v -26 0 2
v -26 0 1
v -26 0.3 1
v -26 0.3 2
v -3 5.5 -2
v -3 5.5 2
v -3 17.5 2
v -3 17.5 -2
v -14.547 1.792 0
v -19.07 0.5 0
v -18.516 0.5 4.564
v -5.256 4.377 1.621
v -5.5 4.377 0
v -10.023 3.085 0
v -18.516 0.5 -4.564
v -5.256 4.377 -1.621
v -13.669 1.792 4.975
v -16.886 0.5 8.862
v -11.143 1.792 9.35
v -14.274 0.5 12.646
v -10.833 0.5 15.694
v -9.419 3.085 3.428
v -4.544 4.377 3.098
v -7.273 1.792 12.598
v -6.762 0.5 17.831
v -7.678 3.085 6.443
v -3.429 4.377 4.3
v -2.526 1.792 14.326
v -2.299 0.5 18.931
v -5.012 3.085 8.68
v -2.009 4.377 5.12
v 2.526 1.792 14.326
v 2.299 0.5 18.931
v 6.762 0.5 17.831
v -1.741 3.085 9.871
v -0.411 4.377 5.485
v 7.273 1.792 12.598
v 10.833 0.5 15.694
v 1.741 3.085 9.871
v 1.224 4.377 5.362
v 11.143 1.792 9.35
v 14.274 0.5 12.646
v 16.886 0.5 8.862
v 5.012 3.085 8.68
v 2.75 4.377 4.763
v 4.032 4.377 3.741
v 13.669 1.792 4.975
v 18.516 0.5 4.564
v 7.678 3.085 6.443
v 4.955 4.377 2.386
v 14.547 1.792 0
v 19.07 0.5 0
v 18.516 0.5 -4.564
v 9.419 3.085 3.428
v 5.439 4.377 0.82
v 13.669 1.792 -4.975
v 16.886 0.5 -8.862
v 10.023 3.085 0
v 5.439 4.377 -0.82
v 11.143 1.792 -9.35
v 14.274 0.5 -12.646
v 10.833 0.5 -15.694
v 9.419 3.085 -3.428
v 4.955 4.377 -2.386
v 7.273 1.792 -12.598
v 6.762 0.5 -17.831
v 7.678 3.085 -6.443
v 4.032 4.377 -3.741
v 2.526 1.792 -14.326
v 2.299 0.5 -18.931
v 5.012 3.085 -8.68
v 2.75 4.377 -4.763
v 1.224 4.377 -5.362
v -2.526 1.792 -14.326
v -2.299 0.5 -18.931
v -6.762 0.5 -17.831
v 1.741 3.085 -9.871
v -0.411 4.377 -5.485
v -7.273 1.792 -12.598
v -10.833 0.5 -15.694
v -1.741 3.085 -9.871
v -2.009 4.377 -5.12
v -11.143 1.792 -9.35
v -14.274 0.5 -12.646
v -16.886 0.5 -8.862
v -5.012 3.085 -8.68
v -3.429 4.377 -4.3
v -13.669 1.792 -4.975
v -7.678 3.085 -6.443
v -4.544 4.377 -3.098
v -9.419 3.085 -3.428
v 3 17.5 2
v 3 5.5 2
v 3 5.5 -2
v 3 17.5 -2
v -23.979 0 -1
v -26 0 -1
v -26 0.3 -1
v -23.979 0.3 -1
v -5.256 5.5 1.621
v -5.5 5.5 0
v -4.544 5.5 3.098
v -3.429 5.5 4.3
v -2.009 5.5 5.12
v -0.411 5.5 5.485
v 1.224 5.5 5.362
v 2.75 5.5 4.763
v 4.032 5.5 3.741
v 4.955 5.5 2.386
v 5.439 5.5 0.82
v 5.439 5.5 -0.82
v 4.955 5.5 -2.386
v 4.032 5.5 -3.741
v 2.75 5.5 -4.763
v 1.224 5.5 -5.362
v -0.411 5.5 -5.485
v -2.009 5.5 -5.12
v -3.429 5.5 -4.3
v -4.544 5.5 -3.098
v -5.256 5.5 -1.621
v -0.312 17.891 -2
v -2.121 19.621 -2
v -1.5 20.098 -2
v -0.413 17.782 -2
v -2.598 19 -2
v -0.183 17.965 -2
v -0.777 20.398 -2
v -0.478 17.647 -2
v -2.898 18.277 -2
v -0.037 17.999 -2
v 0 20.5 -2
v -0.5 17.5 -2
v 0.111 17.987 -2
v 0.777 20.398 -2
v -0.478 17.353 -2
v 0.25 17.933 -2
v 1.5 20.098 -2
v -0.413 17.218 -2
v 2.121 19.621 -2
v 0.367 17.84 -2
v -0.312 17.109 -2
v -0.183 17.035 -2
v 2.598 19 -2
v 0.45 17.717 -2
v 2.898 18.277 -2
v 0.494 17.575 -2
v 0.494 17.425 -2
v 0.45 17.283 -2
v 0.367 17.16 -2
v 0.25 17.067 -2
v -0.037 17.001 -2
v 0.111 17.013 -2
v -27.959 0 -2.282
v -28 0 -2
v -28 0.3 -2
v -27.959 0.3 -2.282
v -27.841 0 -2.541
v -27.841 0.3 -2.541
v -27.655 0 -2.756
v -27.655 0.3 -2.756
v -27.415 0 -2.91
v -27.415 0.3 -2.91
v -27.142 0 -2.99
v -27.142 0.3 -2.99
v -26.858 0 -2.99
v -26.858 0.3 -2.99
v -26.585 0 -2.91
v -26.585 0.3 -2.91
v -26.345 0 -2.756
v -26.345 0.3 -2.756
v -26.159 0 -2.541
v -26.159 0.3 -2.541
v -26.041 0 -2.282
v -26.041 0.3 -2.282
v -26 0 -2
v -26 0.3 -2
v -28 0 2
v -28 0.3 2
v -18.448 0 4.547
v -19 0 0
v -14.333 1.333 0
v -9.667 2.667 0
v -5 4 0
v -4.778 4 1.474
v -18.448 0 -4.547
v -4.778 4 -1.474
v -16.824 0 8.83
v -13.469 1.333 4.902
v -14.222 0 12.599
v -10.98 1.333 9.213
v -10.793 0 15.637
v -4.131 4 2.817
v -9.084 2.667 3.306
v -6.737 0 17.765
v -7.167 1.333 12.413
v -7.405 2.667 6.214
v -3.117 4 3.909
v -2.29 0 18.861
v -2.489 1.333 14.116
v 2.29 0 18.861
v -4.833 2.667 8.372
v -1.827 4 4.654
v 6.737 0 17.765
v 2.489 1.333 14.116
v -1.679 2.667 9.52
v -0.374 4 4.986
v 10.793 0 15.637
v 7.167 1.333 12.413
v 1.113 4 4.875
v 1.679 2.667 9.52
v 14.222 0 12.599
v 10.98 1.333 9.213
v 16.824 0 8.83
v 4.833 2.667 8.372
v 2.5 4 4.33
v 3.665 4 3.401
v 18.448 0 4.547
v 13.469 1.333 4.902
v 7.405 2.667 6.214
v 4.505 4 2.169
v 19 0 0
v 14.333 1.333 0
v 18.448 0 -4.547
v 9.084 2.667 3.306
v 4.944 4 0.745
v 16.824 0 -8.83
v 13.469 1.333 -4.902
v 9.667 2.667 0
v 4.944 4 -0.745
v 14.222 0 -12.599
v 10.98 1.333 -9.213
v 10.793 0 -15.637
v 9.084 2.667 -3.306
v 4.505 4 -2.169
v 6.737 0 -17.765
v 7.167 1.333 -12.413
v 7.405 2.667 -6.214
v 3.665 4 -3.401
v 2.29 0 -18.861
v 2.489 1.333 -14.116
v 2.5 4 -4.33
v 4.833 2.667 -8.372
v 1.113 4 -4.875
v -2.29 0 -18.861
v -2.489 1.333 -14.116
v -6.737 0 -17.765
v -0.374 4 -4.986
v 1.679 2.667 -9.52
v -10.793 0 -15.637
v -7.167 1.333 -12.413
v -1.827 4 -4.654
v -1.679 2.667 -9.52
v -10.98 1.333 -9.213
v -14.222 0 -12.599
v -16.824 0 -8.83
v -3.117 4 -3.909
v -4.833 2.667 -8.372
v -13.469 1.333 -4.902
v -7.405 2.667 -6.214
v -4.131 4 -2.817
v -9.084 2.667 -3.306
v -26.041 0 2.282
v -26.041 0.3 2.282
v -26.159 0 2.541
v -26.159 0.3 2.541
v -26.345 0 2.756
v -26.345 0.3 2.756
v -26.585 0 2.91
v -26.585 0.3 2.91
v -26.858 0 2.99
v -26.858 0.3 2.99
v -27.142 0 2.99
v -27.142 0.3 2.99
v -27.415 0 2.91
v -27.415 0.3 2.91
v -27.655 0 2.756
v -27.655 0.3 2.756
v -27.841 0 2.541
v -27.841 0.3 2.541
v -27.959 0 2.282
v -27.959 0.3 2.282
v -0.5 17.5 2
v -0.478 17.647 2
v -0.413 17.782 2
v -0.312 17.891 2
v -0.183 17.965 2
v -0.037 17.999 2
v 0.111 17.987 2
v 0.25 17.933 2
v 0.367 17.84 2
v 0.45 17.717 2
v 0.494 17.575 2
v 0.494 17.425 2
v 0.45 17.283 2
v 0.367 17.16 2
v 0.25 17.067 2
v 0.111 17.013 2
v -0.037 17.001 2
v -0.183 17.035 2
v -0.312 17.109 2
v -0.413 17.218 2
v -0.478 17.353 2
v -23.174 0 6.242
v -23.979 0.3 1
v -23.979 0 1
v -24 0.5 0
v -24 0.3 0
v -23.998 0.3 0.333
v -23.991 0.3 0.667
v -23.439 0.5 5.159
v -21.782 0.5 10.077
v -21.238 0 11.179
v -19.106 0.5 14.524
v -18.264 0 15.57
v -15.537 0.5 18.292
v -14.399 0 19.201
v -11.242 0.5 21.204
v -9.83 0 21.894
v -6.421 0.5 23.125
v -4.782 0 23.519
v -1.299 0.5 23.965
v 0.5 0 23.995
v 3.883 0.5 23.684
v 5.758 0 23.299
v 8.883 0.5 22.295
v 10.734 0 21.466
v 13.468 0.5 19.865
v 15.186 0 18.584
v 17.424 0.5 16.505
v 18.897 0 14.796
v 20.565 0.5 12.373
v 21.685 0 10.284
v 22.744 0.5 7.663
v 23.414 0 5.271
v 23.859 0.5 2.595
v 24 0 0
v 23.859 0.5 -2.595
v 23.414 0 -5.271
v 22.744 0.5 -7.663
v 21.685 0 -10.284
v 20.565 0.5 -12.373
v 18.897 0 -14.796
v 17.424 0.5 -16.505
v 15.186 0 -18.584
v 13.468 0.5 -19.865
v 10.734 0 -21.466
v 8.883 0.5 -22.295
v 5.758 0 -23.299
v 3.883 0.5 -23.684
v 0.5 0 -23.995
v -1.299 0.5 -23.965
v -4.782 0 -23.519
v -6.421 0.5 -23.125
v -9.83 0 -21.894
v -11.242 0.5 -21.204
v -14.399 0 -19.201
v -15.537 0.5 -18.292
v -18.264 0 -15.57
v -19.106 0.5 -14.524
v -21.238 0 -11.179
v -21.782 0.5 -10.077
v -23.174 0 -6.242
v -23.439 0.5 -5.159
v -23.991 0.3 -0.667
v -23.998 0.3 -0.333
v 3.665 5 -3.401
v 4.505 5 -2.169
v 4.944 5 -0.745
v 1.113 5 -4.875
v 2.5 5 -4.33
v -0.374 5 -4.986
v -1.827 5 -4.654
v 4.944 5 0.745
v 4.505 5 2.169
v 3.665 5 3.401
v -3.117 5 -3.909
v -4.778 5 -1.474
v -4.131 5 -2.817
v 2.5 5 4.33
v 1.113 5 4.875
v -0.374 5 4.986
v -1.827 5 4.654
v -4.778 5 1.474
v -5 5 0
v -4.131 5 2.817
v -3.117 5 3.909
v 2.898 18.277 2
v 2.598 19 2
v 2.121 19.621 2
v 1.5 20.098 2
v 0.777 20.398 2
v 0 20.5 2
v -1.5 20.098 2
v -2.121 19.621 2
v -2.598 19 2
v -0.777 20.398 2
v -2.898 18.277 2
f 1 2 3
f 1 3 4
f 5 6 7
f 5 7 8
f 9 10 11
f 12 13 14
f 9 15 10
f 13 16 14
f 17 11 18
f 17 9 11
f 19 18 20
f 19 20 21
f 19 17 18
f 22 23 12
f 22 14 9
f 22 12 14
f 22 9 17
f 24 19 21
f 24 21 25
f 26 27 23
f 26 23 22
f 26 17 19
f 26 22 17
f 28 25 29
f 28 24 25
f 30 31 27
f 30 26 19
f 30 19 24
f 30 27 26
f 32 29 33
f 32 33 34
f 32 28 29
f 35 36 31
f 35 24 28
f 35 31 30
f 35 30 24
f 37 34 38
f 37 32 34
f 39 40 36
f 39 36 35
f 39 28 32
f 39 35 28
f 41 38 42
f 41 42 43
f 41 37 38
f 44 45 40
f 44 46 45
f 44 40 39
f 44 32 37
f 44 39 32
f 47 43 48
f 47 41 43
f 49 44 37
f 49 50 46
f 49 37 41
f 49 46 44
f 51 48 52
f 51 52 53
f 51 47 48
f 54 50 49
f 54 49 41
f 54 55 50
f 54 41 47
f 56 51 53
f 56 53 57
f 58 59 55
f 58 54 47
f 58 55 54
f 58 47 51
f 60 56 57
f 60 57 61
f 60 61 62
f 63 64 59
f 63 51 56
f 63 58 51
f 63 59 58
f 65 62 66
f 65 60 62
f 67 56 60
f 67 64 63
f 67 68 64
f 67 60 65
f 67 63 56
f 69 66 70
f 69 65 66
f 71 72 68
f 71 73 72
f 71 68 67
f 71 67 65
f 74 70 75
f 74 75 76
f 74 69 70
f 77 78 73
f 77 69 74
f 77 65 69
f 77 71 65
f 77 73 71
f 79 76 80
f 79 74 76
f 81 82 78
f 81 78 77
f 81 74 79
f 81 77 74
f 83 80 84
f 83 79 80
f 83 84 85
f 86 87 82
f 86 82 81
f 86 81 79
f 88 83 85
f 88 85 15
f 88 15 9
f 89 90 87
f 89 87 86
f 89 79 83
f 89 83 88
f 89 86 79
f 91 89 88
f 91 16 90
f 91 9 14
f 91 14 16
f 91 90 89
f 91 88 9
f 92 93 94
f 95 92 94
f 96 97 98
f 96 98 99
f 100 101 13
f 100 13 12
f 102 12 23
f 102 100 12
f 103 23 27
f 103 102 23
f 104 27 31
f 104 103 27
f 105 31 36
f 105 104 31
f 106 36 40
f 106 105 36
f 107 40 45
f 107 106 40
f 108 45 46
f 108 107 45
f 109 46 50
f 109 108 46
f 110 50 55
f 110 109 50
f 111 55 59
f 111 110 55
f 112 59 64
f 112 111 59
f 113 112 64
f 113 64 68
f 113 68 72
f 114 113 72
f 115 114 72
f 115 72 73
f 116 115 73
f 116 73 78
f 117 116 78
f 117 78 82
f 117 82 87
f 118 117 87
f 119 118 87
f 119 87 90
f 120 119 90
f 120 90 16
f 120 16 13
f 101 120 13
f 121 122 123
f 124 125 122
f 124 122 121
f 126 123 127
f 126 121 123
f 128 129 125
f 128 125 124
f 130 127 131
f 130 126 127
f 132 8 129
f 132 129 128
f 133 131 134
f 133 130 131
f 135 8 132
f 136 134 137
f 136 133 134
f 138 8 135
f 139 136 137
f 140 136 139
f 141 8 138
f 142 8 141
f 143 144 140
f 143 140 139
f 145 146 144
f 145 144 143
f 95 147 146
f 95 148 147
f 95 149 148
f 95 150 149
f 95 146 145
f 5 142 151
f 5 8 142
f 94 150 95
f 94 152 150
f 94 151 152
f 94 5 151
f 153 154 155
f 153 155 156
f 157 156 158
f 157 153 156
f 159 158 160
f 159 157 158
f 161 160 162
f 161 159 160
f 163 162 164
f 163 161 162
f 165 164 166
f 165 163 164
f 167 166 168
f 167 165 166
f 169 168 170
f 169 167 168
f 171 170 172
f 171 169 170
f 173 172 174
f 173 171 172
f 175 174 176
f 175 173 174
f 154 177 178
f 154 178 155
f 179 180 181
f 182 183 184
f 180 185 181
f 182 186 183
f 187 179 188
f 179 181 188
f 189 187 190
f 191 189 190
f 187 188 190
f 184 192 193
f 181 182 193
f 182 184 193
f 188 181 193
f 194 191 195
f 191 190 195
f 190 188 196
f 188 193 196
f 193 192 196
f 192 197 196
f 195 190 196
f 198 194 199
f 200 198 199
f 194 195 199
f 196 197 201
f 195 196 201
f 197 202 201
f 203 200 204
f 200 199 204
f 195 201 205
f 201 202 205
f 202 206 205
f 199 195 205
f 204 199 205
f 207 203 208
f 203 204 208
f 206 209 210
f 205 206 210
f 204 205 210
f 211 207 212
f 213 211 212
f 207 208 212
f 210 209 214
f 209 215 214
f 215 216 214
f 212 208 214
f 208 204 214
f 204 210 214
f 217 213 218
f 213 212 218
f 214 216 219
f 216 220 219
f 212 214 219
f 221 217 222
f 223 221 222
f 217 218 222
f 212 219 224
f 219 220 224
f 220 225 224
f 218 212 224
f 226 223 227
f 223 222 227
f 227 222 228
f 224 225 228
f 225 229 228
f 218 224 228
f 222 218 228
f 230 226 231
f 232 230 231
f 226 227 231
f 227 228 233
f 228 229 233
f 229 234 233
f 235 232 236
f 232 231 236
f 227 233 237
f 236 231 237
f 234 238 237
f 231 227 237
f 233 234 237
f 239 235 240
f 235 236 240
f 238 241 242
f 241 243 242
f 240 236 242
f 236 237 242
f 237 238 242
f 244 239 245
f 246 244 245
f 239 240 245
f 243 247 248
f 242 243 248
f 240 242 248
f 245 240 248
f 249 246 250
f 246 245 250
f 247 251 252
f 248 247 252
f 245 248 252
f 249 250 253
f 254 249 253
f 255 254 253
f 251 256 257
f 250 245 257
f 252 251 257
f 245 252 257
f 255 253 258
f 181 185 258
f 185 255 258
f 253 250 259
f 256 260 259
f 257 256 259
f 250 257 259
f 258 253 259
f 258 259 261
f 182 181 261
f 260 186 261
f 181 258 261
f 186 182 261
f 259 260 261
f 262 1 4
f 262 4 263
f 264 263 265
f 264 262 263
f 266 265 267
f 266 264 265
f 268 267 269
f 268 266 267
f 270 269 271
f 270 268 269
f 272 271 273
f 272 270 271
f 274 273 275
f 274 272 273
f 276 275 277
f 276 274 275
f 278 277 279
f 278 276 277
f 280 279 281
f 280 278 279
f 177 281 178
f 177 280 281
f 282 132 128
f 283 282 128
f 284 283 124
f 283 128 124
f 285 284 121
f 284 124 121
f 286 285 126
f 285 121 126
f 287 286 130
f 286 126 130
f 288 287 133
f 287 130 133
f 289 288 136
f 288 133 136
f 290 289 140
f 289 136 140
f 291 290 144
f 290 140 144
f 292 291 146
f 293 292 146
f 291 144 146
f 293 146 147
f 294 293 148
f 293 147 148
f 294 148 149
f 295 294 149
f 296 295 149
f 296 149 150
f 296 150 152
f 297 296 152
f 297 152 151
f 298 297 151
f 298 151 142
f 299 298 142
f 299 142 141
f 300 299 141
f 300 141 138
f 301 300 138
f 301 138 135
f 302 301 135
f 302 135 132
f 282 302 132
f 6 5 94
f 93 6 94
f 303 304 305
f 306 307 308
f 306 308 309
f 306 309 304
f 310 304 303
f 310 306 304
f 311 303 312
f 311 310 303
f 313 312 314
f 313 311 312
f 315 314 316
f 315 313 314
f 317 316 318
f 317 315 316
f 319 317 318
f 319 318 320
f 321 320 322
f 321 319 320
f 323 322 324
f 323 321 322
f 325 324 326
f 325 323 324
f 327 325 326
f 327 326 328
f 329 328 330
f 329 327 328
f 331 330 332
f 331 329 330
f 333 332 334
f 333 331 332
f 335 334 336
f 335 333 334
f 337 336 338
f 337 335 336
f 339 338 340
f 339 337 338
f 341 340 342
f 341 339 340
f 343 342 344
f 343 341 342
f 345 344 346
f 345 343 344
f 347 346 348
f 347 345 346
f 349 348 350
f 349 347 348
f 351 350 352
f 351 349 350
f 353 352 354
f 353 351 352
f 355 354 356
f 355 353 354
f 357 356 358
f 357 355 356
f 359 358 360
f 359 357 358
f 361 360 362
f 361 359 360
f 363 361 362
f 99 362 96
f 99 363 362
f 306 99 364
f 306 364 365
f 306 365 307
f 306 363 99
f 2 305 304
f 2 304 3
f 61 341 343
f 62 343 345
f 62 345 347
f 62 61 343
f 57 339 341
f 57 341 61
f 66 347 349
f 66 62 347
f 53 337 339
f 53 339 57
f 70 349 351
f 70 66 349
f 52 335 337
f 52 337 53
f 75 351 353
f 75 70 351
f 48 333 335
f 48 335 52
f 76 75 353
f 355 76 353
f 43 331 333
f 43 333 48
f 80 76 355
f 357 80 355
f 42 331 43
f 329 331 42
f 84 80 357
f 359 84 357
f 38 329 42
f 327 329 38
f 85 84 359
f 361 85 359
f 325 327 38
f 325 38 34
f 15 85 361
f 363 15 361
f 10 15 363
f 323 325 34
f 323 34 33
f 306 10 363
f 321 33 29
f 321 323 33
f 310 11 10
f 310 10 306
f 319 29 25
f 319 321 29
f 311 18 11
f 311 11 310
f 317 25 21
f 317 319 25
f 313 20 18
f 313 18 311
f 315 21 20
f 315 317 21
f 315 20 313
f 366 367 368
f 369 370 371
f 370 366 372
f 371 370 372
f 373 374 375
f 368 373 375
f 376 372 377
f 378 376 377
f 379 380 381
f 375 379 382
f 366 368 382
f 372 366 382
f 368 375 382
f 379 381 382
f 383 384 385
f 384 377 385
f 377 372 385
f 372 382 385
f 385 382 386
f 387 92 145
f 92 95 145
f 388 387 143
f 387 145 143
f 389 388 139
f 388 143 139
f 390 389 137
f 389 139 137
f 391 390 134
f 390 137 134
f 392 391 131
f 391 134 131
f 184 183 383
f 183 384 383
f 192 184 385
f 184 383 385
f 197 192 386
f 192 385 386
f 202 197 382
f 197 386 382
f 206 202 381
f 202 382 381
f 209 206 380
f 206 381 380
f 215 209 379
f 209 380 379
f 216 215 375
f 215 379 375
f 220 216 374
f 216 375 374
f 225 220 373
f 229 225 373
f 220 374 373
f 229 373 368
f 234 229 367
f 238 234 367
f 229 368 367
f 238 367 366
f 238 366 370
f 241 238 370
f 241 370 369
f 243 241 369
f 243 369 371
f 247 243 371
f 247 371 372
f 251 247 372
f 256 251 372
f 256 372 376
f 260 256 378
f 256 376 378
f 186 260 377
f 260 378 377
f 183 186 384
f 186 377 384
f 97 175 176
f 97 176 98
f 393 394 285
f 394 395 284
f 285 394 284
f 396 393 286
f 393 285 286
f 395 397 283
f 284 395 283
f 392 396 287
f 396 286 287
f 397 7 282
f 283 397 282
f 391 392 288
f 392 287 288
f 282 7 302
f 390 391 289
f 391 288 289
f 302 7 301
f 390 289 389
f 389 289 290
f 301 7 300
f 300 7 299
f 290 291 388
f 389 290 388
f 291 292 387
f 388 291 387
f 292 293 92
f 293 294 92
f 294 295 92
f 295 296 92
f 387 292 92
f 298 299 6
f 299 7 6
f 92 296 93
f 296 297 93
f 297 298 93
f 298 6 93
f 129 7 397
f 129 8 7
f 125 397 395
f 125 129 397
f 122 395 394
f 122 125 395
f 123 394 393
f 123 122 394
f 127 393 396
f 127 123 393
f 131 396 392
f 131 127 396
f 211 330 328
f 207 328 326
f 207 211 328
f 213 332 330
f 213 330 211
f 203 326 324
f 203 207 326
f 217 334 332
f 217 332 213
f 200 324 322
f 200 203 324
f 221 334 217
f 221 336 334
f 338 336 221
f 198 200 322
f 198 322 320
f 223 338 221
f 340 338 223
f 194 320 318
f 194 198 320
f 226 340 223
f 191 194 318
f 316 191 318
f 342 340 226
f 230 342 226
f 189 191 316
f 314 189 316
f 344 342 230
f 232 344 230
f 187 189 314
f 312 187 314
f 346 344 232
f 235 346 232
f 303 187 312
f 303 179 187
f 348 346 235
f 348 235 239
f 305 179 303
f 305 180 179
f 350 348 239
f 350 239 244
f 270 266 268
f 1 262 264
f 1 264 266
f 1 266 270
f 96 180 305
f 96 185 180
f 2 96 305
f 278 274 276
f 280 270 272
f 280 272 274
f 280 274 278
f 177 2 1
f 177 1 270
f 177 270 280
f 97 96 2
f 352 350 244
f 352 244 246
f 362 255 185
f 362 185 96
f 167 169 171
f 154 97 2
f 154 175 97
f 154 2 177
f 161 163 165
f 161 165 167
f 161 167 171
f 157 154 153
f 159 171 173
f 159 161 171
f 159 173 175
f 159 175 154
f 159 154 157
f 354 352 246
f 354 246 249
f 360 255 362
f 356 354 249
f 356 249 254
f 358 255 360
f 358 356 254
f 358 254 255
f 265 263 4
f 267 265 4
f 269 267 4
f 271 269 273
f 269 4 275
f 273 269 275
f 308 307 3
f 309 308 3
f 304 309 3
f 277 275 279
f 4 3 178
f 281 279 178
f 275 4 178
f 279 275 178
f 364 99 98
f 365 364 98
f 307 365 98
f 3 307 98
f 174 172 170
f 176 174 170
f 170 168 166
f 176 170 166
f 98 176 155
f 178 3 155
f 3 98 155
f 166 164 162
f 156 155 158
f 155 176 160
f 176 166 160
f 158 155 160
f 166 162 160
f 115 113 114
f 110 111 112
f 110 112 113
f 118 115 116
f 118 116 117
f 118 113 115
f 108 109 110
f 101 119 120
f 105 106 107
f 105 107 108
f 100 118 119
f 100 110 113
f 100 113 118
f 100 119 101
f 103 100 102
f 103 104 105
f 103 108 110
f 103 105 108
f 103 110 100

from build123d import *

# Parameters (mm, degrees)
PAD_THICKEN_T1        = 0.5
PLUNGER_PROFILE_W     = 6
PLUNGER_PROFILE_H     = 4
PLUNGER_EXTRUDE_DEPTH = 15
PLUNGER_FILLET_R      = 3
PIN_HOLE_PROFILE_R    = 0.5
PIN_HOLE_CUT_DEPTH    = 5
TAG_EXTRUDE_DEPTH     = 0.3


with BuildPart() as body_1:
    # Pad Surface Revolve: a surface, the sketch's curves turned about an axis
    with BuildLine(Plane.XY, mode=Mode.PRIVATE) as pad_surface_revolve_1_path:
        Line((-24, 0), (-19, 0))
        Line((-19, 0), (-5, 4))
        Line((-5, 4), (-5, 5))
        Line((-5, 5), (0, 5))
    pad_surface_revolve_1 = Shell.revolve(pad_surface_revolve_1_path.wire(), 360, Axis((0, 0, 0), (0, 1, 0)))
    add(Solid.thicken(pad_surface_revolve_1, PAD_THICKEN_T1))

    # Tag Profile → Tag Extrude (add)
    with BuildSketch(Plane(origin=(0, 0, 0), x_dir=(1, 0, 0), z_dir=(0, 1, 0))):
        with BuildLine():
            Line((-26, 2), (-26, 1))
            Line((-26, 1), (-23, 1))
            Line((-23, 1), (-23, -1))
            Line((-23, -1), (-26, -1))
            Line((-26, -1), (-26, -2))
            ThreePointArc((-26, -2), (-27, -3), (-28, -2))
            Line((-28, -2), (-28, 2))
            ThreePointArc((-28, 2), (-27, 3), (-26, 2))
        make_face()
    extrude(amount=TAG_EXTRUDE_DEPTH)


with BuildPart() as body_2:
    # Plunger Profile → Plunger Extrude (new body)
    with BuildSketch(Plane(origin=(0, 5.5, 0), x_dir=(1, 0, 0), z_dir=(0, 1, 0))):
        Rectangle(PLUNGER_PROFILE_W, PLUNGER_PROFILE_H)
    extrude(amount=PLUNGER_EXTRUDE_DEPTH)

    # Plunger Fillet
    plunger_fillet_edges = [body_2.edges().sort_by_distance(p)[0] for p in [
        (-3, 20.5, 0),
        (3, 20.5, 0),
    ]]
    fillet(plunger_fillet_edges, radius=PLUNGER_FILLET_R - 0.0001)  # a hair under: the kernel refuses the full size

    # Pin Hole Profile → Pin Hole Cut (cut)
    with BuildSketch(Plane(origin=(0, 0, -2), x_dir=(-1, 0, 0), z_dir=(0, 0, -1))):
        with Locations((0, 17.5)):
            Circle(PIN_HOLE_PROFILE_R)
    extrude(amount=-PIN_HOLE_CUT_DEPTH, mode=Mode.SUBTRACT)


solid = Compound([body_1.part, body_2.part])
